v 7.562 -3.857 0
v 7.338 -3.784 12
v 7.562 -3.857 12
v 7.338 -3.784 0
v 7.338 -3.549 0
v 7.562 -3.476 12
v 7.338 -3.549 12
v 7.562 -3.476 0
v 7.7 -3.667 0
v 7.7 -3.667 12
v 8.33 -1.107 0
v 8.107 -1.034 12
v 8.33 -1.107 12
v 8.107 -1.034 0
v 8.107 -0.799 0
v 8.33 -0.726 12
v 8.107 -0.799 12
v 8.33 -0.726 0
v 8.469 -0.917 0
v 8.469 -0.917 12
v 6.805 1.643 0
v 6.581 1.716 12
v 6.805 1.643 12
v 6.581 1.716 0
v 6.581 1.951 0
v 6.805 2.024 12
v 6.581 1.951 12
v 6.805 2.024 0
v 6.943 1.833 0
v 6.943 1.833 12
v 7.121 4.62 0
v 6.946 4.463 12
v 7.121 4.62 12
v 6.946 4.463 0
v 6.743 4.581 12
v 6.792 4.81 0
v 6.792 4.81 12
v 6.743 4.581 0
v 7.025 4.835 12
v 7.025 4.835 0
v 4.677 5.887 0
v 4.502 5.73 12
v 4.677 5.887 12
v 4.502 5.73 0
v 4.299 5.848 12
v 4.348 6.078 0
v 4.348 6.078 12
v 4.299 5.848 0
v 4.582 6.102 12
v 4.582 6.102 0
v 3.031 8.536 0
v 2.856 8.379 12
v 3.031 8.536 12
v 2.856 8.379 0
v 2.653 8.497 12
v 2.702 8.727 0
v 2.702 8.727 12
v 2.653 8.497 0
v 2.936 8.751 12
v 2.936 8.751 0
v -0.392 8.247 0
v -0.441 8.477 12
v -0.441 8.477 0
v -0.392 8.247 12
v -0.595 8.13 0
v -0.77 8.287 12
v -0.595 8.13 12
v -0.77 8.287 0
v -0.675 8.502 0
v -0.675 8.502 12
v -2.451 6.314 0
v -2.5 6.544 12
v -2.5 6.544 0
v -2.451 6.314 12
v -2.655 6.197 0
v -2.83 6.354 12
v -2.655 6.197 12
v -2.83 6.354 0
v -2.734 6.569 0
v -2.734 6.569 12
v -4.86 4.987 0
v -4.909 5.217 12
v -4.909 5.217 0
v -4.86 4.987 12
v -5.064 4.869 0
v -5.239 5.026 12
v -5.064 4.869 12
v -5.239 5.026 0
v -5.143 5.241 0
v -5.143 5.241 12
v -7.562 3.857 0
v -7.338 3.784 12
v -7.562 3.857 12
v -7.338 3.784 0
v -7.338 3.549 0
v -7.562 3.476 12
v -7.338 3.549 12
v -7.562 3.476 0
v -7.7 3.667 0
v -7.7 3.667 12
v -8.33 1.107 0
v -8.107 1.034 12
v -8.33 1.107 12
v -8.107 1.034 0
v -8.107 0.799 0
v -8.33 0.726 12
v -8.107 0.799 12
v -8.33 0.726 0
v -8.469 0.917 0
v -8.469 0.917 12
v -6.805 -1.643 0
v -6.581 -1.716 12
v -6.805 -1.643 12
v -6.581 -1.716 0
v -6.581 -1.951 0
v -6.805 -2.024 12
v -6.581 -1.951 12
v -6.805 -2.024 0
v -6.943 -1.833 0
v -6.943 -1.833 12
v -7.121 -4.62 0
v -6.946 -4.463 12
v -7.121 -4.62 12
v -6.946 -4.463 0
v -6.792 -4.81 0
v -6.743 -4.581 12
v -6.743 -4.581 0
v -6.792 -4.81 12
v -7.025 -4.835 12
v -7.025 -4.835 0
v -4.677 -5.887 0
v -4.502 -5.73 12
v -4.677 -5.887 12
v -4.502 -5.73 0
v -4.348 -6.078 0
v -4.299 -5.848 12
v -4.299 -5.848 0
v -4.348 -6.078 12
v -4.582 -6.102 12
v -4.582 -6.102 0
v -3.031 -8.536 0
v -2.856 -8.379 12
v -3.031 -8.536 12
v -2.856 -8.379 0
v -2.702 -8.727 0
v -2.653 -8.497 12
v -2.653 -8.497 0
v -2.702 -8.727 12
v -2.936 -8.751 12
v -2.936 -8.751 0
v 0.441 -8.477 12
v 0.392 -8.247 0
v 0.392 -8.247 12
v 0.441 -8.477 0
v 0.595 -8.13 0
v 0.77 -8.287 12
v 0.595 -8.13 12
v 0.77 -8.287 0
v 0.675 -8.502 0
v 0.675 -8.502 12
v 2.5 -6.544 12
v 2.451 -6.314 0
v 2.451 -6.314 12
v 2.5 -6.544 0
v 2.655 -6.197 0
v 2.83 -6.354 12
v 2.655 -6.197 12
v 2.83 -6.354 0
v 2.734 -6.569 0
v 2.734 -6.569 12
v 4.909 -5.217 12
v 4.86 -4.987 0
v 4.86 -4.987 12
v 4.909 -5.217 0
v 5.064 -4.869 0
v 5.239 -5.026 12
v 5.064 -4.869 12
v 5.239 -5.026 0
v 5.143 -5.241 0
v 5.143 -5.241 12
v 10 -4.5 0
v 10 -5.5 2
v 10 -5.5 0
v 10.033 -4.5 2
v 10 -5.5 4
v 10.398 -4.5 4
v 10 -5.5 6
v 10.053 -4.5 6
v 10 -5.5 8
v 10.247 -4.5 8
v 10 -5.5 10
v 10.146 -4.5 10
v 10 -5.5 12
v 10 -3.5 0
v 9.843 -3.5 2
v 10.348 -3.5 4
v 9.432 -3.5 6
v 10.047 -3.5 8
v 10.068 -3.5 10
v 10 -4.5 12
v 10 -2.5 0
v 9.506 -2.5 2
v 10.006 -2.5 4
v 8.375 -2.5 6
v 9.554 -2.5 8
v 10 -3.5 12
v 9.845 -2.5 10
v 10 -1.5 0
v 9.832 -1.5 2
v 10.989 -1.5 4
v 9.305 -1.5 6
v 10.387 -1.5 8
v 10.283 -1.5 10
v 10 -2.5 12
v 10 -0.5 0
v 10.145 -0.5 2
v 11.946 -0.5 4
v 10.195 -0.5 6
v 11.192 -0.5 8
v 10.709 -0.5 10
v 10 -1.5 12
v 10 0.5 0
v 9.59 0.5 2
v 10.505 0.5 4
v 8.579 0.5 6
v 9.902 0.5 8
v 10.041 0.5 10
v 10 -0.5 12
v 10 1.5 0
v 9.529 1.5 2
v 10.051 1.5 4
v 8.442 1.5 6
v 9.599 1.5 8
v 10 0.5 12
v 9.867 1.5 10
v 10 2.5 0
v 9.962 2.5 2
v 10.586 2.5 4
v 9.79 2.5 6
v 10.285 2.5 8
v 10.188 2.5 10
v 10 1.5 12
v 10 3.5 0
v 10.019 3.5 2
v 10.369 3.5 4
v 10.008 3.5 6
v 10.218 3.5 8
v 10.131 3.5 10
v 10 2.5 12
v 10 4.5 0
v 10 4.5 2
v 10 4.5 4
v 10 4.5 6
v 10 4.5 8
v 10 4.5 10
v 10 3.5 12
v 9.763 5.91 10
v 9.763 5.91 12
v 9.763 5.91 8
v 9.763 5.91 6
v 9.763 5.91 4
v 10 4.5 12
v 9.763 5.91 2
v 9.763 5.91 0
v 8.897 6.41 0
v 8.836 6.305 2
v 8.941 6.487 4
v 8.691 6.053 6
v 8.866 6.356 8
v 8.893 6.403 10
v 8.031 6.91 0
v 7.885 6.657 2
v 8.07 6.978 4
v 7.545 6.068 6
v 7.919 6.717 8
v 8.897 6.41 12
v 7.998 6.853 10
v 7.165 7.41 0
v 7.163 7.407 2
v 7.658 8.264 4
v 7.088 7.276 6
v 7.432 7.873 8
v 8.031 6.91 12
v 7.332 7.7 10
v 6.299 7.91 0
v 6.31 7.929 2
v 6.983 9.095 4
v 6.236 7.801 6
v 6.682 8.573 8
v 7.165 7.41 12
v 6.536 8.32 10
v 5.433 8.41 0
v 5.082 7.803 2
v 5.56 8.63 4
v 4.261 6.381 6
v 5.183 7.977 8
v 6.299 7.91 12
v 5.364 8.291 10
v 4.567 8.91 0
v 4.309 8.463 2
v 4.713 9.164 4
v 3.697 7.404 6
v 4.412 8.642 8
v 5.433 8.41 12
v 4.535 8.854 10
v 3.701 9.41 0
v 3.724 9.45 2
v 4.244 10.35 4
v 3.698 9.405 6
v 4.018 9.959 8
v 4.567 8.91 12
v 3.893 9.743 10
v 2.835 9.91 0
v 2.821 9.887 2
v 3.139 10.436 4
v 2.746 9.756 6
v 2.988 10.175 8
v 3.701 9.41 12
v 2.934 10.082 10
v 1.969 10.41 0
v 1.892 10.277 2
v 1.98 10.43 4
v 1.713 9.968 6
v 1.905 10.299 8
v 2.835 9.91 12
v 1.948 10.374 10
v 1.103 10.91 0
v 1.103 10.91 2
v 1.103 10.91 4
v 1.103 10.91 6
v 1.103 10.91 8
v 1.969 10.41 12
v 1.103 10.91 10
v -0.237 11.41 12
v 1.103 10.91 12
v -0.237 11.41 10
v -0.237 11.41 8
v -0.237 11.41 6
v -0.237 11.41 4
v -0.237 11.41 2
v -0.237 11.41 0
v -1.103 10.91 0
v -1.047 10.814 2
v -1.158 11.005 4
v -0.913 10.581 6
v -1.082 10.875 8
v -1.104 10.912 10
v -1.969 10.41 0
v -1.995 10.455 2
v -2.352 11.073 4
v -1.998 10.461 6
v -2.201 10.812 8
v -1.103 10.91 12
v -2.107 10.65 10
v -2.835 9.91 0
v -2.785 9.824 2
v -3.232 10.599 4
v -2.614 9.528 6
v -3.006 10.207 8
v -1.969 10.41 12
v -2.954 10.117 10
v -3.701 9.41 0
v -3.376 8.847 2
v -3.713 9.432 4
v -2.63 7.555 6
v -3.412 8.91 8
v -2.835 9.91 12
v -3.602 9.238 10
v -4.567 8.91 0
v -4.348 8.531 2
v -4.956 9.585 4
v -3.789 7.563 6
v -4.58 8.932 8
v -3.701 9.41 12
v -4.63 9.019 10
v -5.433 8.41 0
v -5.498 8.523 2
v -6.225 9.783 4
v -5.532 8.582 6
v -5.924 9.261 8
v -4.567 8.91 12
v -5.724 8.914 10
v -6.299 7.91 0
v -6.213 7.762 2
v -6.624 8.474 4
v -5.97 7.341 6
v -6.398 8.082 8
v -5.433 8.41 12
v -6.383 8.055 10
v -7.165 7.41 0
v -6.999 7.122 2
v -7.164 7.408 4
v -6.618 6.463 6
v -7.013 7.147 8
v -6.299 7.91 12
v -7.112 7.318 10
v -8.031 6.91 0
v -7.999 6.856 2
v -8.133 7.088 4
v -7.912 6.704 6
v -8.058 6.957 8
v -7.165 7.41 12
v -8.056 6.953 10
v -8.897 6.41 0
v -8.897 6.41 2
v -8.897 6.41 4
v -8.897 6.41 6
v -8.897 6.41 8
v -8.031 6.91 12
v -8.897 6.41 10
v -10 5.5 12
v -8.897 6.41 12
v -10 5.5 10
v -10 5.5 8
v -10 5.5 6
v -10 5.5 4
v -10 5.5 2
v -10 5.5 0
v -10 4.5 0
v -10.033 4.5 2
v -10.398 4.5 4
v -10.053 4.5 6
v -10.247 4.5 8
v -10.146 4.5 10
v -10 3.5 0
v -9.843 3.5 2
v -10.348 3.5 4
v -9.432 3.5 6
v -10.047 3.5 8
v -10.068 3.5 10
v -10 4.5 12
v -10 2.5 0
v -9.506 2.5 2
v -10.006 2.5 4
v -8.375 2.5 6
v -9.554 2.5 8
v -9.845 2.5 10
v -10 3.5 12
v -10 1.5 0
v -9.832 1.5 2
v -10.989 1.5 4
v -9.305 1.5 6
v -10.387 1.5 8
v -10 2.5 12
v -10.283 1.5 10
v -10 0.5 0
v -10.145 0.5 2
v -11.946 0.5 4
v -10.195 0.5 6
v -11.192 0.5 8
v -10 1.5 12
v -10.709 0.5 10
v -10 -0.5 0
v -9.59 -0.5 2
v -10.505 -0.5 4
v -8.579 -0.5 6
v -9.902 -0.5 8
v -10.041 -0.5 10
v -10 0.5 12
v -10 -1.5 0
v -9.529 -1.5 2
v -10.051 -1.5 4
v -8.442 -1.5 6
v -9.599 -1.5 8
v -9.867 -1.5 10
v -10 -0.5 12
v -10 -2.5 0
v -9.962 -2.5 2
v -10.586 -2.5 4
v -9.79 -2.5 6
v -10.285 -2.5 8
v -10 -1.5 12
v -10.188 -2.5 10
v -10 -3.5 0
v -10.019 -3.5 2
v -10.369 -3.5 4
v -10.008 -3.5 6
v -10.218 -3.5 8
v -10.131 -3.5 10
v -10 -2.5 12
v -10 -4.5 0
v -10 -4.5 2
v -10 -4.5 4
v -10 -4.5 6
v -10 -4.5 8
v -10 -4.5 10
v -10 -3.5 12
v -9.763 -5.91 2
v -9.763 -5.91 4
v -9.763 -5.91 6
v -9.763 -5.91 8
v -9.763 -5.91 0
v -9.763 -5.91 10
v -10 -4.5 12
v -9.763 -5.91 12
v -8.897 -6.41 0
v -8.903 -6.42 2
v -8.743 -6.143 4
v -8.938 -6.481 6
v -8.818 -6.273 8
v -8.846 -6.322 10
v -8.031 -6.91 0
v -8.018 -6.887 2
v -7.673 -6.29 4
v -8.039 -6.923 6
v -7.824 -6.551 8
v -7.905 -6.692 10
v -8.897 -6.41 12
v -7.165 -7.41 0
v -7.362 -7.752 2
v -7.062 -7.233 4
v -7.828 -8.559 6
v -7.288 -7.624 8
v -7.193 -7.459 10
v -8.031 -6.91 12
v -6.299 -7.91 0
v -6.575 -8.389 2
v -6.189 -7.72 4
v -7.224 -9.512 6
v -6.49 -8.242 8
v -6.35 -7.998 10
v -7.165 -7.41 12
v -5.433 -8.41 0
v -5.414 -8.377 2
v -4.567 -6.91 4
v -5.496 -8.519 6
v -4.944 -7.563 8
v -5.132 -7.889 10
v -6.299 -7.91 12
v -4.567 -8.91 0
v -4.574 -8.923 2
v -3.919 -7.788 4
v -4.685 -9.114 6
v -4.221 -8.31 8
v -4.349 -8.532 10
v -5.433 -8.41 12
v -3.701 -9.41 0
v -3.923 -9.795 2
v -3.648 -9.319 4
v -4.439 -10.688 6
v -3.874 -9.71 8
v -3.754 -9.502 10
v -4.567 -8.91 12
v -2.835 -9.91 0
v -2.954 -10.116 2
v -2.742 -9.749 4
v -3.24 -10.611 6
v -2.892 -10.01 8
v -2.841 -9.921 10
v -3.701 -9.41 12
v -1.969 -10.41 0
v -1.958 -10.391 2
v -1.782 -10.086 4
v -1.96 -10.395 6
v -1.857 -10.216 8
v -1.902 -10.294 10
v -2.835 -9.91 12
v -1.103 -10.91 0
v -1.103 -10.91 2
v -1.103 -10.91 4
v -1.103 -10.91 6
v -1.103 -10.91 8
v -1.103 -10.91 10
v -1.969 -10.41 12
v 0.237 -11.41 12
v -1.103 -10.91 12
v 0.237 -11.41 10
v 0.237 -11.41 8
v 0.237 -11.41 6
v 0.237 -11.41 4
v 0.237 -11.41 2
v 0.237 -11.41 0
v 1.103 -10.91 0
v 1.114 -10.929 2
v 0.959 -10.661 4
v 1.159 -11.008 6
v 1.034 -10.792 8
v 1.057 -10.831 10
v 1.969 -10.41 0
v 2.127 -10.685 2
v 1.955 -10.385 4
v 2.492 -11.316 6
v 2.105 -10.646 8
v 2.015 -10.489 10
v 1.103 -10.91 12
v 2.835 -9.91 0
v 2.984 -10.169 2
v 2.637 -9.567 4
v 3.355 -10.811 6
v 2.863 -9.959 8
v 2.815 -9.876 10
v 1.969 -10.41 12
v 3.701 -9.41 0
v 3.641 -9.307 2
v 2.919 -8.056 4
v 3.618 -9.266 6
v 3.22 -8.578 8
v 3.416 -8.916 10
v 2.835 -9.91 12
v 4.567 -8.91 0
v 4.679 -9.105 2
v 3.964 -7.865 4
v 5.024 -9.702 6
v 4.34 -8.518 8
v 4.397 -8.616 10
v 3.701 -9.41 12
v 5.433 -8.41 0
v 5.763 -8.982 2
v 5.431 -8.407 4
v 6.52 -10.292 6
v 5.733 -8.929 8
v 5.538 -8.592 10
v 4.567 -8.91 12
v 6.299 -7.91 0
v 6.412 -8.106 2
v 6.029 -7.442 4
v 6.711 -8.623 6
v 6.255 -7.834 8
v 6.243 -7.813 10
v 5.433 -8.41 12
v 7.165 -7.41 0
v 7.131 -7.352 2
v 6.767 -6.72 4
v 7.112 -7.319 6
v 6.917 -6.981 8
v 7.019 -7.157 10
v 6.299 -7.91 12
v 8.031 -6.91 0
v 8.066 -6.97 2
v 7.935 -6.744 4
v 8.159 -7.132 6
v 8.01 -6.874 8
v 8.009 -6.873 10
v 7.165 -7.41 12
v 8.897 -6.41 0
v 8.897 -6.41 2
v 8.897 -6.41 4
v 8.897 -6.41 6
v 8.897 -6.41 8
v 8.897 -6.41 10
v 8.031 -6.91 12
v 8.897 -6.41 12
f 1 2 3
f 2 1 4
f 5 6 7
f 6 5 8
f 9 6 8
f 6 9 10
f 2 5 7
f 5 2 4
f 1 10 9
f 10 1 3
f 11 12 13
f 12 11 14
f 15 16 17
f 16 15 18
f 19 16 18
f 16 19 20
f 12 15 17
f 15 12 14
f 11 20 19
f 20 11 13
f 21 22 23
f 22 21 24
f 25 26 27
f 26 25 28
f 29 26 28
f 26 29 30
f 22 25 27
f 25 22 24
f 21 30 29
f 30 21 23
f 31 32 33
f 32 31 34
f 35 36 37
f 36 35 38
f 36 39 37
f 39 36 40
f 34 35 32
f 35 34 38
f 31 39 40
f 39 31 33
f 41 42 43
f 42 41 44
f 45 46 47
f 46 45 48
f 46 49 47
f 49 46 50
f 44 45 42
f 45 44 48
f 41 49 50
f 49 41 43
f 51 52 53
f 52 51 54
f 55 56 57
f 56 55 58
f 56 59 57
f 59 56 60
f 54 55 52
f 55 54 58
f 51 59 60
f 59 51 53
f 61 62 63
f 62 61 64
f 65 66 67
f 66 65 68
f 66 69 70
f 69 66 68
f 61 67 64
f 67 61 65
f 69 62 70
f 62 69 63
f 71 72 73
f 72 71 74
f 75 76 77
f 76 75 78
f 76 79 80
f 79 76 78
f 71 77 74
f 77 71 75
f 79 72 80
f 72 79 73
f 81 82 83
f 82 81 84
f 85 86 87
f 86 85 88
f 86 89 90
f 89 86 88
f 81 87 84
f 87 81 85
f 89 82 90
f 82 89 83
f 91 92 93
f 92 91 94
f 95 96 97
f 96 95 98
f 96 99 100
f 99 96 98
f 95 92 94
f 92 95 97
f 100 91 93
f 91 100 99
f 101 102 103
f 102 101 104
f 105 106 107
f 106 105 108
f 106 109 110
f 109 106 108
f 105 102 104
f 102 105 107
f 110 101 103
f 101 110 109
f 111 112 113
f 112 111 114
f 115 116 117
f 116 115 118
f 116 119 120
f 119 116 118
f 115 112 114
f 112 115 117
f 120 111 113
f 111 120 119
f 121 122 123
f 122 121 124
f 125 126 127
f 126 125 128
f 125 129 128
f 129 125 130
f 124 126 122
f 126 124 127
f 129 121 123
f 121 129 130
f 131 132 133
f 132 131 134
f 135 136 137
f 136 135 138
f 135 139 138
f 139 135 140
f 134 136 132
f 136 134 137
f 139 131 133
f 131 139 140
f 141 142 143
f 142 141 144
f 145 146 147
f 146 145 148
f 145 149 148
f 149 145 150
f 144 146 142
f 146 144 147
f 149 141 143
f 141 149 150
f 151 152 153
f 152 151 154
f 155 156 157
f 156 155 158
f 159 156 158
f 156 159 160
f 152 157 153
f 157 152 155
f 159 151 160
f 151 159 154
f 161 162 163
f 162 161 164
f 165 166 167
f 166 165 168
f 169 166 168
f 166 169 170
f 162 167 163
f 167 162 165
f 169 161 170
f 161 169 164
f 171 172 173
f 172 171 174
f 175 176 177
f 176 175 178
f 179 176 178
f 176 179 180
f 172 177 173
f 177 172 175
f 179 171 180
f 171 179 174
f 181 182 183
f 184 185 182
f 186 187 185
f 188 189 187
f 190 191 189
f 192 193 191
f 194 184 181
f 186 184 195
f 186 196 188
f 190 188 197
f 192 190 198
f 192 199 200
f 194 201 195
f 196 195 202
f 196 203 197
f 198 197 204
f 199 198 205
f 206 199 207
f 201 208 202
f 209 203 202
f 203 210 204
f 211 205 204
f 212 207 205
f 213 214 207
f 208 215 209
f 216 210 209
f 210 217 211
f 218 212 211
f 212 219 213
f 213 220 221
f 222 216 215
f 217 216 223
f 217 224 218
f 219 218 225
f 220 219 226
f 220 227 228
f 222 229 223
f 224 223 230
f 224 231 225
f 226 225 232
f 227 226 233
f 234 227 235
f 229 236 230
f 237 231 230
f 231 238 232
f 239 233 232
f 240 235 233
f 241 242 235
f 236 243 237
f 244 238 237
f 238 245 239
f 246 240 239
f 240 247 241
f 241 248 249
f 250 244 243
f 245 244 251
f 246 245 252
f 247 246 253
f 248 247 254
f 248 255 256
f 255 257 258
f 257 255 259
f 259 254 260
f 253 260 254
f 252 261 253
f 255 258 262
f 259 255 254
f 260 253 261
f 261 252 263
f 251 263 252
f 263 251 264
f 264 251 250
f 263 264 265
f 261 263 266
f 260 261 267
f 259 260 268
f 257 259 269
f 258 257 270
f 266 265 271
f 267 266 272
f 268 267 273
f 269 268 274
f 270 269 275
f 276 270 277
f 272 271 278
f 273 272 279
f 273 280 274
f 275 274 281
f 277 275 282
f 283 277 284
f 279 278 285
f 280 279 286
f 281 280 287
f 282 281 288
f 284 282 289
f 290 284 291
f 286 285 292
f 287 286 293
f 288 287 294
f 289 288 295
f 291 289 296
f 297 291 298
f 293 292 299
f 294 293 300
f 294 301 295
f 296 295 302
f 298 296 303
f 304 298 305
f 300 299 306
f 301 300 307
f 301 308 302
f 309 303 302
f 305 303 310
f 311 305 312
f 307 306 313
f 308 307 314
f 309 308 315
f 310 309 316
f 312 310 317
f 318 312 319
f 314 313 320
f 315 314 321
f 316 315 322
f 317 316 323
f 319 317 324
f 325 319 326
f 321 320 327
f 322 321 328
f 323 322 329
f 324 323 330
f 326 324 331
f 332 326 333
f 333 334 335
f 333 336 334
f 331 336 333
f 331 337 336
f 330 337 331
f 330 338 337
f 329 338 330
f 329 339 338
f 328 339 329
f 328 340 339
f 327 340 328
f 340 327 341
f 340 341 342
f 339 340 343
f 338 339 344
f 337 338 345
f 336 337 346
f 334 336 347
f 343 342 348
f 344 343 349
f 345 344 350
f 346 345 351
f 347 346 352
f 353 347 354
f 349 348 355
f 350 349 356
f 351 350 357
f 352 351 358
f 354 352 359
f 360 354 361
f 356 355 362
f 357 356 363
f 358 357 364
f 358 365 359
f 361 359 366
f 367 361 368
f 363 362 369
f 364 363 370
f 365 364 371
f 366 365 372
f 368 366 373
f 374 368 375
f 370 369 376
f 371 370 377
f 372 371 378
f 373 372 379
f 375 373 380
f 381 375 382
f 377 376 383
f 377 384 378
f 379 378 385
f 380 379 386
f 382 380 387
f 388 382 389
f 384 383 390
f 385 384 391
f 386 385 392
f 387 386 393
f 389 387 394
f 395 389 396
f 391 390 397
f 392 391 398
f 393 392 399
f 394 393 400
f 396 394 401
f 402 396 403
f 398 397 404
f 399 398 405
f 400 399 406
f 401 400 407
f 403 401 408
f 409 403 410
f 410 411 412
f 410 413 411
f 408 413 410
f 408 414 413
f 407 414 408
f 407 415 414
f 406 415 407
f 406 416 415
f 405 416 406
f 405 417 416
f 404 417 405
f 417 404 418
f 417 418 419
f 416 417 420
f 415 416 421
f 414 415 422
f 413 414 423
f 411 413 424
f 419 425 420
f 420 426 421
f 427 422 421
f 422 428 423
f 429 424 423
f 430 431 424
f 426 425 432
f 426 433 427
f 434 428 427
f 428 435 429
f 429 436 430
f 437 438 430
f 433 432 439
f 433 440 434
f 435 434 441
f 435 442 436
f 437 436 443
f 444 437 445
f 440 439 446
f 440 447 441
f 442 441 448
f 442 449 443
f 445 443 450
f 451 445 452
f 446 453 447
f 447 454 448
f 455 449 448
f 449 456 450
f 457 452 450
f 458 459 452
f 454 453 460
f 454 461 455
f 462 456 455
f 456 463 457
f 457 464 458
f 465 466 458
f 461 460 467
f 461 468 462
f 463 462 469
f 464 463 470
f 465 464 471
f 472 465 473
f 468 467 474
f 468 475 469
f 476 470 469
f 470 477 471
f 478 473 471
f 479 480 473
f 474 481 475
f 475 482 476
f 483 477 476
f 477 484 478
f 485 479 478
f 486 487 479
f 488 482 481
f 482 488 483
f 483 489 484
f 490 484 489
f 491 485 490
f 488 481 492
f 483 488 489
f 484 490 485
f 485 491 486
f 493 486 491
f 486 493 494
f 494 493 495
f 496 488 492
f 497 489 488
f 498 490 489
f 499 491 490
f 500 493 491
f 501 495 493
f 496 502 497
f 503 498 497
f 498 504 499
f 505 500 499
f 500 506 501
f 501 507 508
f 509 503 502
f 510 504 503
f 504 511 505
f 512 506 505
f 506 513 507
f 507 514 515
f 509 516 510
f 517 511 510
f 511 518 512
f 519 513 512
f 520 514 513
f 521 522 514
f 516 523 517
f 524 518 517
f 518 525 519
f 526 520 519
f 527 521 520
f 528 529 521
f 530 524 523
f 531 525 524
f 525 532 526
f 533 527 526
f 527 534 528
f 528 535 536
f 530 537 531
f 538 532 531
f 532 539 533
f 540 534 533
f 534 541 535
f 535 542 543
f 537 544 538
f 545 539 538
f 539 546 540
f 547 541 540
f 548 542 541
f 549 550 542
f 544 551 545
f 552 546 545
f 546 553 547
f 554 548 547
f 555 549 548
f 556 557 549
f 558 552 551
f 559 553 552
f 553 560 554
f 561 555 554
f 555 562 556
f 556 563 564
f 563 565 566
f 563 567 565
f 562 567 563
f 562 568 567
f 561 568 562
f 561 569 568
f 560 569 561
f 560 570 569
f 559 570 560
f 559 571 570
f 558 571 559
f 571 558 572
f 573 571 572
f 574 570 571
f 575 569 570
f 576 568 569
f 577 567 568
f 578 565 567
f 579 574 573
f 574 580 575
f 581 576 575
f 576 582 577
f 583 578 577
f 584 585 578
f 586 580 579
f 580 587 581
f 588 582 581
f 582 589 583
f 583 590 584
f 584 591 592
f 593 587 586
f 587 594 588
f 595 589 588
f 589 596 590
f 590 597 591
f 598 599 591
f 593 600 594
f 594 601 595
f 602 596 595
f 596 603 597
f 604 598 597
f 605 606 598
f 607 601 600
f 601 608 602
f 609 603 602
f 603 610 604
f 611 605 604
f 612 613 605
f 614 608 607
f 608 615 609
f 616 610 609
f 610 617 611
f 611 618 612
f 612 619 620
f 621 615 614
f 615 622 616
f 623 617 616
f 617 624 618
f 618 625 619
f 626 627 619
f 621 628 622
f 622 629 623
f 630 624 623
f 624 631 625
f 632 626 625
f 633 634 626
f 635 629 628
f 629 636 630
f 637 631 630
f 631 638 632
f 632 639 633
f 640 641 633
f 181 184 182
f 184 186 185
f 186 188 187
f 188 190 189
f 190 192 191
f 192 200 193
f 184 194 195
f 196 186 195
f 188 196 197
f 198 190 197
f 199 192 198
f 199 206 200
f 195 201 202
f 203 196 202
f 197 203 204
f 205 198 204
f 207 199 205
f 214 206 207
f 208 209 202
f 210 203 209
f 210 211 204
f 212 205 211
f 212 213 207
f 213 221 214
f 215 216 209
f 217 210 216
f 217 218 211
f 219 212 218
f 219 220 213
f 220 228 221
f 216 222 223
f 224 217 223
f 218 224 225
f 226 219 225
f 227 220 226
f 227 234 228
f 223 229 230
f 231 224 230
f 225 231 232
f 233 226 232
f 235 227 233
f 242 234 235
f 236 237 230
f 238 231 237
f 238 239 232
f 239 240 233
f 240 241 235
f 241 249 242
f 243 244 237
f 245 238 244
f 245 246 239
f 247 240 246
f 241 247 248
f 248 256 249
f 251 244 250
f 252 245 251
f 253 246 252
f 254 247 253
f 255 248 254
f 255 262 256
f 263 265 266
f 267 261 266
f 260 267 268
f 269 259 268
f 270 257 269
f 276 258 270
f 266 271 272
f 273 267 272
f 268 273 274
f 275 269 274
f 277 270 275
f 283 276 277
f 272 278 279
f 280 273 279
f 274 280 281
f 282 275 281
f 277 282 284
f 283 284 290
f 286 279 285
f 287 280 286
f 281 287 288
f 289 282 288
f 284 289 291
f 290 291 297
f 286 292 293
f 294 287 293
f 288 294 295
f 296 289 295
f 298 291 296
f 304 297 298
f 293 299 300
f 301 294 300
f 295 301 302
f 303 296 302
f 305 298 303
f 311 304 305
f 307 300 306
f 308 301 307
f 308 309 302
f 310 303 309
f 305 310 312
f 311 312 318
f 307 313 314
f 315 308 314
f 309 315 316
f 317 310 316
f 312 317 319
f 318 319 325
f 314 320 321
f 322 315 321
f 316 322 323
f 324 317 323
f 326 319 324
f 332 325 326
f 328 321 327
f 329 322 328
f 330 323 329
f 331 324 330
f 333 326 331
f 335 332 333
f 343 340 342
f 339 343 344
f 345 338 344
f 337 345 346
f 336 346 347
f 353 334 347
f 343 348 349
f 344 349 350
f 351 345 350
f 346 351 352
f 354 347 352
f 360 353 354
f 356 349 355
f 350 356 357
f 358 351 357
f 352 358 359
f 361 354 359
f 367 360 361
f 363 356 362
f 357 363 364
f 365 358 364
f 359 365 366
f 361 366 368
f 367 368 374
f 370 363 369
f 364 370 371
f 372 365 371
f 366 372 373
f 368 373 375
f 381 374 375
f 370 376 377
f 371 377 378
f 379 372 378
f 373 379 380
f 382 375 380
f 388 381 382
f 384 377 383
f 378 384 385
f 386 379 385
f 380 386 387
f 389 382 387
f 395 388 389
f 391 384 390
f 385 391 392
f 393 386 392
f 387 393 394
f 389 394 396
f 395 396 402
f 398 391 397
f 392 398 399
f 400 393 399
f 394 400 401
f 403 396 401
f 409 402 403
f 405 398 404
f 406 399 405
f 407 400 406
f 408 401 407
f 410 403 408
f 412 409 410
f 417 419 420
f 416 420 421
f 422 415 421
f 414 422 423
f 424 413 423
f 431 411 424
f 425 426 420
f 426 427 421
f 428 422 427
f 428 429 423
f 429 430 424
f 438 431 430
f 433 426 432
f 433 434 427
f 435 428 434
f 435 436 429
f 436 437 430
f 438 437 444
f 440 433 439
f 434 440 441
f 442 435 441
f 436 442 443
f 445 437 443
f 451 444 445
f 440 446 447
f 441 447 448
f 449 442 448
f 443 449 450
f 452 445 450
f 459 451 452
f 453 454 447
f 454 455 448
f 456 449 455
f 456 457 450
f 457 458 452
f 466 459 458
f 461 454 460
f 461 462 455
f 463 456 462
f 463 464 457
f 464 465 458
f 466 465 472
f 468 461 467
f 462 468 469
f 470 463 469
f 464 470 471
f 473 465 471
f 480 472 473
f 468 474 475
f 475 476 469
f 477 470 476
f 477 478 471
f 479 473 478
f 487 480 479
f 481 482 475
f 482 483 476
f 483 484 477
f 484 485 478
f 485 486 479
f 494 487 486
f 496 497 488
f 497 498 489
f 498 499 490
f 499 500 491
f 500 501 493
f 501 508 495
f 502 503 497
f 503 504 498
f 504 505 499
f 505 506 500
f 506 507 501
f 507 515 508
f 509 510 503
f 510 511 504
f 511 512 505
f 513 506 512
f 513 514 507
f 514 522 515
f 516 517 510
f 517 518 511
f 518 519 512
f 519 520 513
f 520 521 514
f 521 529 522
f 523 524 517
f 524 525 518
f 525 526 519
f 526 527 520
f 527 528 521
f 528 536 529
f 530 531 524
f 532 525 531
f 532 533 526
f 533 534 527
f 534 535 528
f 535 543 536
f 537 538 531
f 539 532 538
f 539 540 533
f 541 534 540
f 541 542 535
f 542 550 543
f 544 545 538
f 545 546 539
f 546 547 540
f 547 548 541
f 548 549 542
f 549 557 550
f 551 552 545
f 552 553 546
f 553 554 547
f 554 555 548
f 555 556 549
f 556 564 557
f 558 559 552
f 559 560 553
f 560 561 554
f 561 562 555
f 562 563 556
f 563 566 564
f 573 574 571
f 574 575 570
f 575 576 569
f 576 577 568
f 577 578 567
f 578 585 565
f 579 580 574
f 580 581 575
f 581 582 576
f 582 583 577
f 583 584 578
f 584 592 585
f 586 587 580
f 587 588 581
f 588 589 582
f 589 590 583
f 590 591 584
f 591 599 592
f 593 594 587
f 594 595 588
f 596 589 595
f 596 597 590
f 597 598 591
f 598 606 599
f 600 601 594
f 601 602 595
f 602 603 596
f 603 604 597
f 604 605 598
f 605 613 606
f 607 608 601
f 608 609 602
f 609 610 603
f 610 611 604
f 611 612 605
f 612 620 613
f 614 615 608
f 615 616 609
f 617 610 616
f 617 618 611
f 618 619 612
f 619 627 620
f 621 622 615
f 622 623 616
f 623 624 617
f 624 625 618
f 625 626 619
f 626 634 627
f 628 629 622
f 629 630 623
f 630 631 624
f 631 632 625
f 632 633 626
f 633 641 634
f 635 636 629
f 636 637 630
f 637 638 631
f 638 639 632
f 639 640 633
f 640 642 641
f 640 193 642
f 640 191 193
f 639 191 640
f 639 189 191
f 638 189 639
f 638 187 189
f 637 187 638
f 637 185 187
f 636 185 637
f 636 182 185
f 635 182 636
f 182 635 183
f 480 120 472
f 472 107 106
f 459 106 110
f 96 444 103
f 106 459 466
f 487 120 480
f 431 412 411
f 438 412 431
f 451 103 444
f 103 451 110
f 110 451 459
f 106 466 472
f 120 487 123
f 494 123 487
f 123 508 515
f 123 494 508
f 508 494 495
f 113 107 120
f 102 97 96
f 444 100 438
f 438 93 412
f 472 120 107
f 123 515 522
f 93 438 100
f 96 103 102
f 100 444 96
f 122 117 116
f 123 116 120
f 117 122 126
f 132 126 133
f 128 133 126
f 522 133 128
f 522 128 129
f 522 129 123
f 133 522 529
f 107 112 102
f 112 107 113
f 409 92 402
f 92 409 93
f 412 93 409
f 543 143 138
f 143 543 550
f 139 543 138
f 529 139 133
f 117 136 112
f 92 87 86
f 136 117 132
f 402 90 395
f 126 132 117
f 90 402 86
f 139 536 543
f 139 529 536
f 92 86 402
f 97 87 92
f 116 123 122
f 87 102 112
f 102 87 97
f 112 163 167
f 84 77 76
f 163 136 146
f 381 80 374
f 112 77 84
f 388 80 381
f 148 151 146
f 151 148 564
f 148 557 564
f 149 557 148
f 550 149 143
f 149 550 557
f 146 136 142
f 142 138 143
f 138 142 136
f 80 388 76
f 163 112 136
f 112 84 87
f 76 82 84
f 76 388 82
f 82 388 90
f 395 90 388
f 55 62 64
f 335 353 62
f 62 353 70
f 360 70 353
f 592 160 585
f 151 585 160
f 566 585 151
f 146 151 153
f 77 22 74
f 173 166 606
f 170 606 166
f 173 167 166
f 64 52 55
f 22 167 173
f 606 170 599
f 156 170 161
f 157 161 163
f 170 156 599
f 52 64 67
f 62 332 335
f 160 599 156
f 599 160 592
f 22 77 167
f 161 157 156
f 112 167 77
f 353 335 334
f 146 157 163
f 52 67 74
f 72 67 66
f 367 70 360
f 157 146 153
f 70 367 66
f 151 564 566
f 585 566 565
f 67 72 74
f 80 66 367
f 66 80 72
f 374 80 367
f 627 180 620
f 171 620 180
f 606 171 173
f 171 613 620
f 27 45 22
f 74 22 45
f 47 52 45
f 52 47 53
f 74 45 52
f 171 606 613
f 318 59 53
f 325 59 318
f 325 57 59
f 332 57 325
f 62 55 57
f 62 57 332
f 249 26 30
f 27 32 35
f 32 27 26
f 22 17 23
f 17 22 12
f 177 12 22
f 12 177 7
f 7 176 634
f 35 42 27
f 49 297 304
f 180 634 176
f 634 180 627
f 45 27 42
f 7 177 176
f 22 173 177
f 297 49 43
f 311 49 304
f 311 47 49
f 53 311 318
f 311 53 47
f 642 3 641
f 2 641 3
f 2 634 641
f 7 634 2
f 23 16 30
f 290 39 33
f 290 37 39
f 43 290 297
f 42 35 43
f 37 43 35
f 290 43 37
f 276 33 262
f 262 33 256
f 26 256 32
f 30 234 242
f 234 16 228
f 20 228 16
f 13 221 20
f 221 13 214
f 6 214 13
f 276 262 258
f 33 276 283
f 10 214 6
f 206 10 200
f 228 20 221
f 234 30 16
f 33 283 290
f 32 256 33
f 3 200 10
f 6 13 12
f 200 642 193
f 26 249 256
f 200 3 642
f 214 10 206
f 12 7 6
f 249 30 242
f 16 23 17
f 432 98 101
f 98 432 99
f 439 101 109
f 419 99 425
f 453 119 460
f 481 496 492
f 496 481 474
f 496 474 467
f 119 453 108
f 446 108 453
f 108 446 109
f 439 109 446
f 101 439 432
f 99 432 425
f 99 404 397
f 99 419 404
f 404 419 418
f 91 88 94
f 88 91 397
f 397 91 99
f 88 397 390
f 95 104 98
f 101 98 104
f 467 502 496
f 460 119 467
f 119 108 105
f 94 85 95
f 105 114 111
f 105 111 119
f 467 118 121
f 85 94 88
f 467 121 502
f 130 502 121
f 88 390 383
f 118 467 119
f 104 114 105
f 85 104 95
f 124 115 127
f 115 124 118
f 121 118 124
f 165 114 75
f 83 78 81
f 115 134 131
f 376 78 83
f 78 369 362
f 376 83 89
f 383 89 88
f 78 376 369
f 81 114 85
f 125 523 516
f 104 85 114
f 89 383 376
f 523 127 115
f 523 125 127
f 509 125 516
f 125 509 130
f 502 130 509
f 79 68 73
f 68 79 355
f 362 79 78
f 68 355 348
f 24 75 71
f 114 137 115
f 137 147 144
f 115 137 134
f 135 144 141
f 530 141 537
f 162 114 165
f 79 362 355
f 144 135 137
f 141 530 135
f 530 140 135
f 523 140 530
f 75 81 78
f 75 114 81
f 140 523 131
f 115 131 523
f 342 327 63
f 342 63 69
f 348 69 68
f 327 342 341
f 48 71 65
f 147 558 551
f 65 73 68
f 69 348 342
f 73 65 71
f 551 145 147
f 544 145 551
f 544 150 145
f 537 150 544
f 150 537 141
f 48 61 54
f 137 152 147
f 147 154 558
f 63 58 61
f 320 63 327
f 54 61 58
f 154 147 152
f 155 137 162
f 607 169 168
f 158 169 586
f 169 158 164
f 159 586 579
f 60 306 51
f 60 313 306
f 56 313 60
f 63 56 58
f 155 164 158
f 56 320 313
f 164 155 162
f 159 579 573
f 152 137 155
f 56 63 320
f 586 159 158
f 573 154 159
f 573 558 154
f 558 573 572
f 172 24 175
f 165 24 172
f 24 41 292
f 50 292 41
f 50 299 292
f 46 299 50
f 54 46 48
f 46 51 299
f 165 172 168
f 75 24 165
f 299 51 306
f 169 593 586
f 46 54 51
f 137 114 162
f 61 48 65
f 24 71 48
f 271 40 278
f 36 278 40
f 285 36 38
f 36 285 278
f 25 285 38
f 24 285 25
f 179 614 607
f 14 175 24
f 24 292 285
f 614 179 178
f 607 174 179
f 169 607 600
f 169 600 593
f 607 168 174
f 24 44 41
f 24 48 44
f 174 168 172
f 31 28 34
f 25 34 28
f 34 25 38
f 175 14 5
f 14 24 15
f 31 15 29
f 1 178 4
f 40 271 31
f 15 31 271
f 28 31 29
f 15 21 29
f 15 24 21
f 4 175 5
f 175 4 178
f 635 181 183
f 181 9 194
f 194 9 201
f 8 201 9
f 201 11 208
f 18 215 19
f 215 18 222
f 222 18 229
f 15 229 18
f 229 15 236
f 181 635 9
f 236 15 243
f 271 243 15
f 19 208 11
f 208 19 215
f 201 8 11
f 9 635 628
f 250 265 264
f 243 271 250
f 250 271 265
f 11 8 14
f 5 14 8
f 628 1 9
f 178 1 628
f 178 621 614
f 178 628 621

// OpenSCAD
use <eggcrate.scad>;

/** Points of a plane, to which the +x axis is normal
    sy, sz: number of samples in y and z directions.
    dy, dz: size of samples in y and z directions, in units.
    x_offset: location of troughs, in units.
    
    Note (if eggcrate.scad still exists when you read this) that this
    one subtly differs from the one in eggcrate.scad: the loop indices
    are reversed, and we leave off the last y, because it is the same
    row of points as the first row in the next plane around the
    hexagonal prism.
 */
function x_grid_points_for_hex(sy, sz, dy, dz, x_offset, last) =
     [for(y=[0:1:(last!=0?sy:sy-1)], z=[0:1:sz])
               [x_offset, y*dy, z*dz]];

function ease(frac, total, x) =
     [for(dontcare=[0:0])
               let(a=floor(frac*total),
                   b=floor((1-frac)*total))
                    (x <= a) ? (x / a) :
                    (x >= b) ? 1 - ((x-b) / a) : 1][0];

/** Points of a wobbly plane, to which the +x axis is normal.
    sy, sz: number of samples in y and z directions.
    dy, dz: size of samples in y and z directions, in units.
    fy, fz: frequency of sine functions in y and z directions -
            given in units, not in samples.
    py, pz: phase in y and z directions - degrees.
    x_offset: location of midpoint of waves, in units.
    amplitude: depth from peak to trough, in units.

    As above, we loop through y first and leave off a row in some
    cases.

*/
function x_eggcrate_points_for_hex(sy, sz, dy, dz, fy, fz,
                           py, pz, ay, az, x_offset, last) =
     [for(y=[0:1:sy-1], z=[0:1:sz])
               let(ease_frac_y = min(max(0.25, 8/sy), 0.5),
                   ease_frac_z = min(max(0.25, 8/sz), 0.5),
                   y_ease = ease(ease_frac_y, sy, y),
                   z_ease = ease(ease_frac_z, sz, z))

               [x_offset+1/4*(0+ /* use 2 if you want troughs at 0 */
                              y_ease*z_ease*ay*sin((y*dy)*fy*360+py)+
                              y_ease*z_ease*az*sin((z*dz)*fz*360+pz)),
                y*dy - (sy/2 * dy),
                z*dz]];

module lace_holes_one_face(how_many, hole_r, from_edge,
                           sy, sz, dy, dz, fy, fz,
                           py, pz, ay, az, x_offset) {
     /* these will be differenced so make them go all the way through */
     h_fudge = 2;
     h = sz * dz;
     center_y = (sy*dy) / (how_many+2);
     for(i=[0:1:how_many-2]) {
          y = (i / how_many) * sy; // 0 to sy or so
          ease_frac_y = min(max(0.25, 8/sy), 0.5);
          y_ease = ease(ease_frac_y, sy, y);
          /* for some reason this doesn't move the hole in far
           * enough. just pass in from_edge > 0 and it will be
           * fine. */
          max_x = x_offset+1/4*(0+
                                y_ease*1*ay*
                                  sin(((y*dy)+center_y)*fy*360+py)+
                                1*1*az*-1);
          x = max_x - from_edge;
          translate([x, y*dy - (sy*dy)/2 + center_y, h/2])
               color("red")
               cylinder(r=hole_r, h=h+h_fudge, center=true);
     }
}

function hex_prism_top_and_bottom_faces(sy, sz) =
     concat([for(y=[0:1:sy-1])
                      [
                       (y+1)*(sz+1)-1,
                           y*(sz+1)-1,
                       /* top center */
                       sy*(sz+1)]],
            [for(y=[0:1:sy-2])
                      [y*(sz+1),
                       (y+1)*(sz+1),
                       /* bottom center */
                       sy*(sz+1)+1]],
            [
                 /* last slice of top */
                 [1*(sz+1)-1, sy*(sz+1)-1, sy*(sz+1)],
                 /* last slice of bottom */
                 [(sy-1)*(sz+1), 0, sy*(sz+1)+1]]);

function hex_prism_grid_points(rmin, sy, sz, dy, dz) =
     concat([for(a=[0:60:360-1],
                      v=x_grid_points_for_hex(sy, sz, dy, dz, rmin, 0))
                      [[cos(a), -sin(a), 0],
                       [sin(a), cos(a), 0],
                       [0, 0, 1]] * v]);

function hex_prism_eggcrate_points(rmin, sy, sz, dy, dz, fy, fz,
                                   py, pz, ay, az) =
     concat([for(a=[0:60:360-1],
                      v=x_eggcrate_points_for_hex(
                           sy, sz, dy, dz, fy, fz,
                           py+a*2, pz+(a>180?180:0),
                           ay, az, rmin, a >= 300 ? 1 : 0))
                      [[cos(a), -sin(a), 0],
                       [sin(a), cos(a),  0],
                       [0,      0,       1]] * v]);

function minusx_last_strip_a(sy, sz) =
     [for(y=[0:1:sy-1])
               [
                y+0+0*(sy+1),
                    y+0+(sz-1)*(sy+1),
                y+1+0*(sy+1)
                    ]];

function minusx_last_strip_b(sy, sz) =
     [for(y=[0:1:sy-1])
               [
                y+0+(sz-1)*(sy+1),
                    y+1+(sz-1)*(sy+1),
                y+1+0*(sy+1)
                    ]];

module hex_prism(rmin, h, res, waves, amp,
                 lace_p, lace_n, lace_r, lace_from_edge) {
     side = rmin * (2*tan(180/6));
     s = [0, floor(side / res.y), floor(h / res.z)];
     f = [0, waves.y/side, waves.z/h];
     p = [0, 0, 0];
     points = concat(
          hex_prism_eggcrate_points(rmin, s.y, s.z, res.y, res.z,
                                    f.y, f.z, p.y, p.z, amp.y, amp.z),
          [[0, 0, (floor(h/res.z)*res.z)],
           [0, 0, 0]]);
     faces = concat(
          minusx_grid_faces_a(s.z, s.y*6-1),
          minusx_grid_faces_b(s.z, s.y*6-1),
          minusx_last_strip_a(s.z, s.y*6),
          minusx_last_strip_b(s.z, s.y*6),
          hex_prism_top_and_bottom_faces(s.y*6, s.z)
          );
     difference() {
          polyhedron(points=points, faces=faces, convexity=20);
          if(lace_p != 0) {
               for(a=[0:60:360-1]) {
                    rotate(a=a, v=[0,0,1])
                         lace_holes_one_face(lace_n, lace_r, lace_from_edge,
                                             s.y, s.z, res.y, res.z, f.y, f.z,
                                             p.y+a*2, p.z+(a>180?180:0),
                                             amp.y, amp.z, rmin);
               }
          }
     }
}

module hex_prism_of_grid(bounds, which, rmin, gap, res, waves, amp,
                         lace_p, lace_n, lace_r, lace_from_edge) {
     rmaj = rmin / cos(180/6);
     side = rmin * (2*tan(180/6));
     row_y = 3/2 * side + gap * sin(60);
     /* rmin: make sure to cover entire width */
     columns = ceil((bounds.x + rmin) / (2*rmin));
     column = which % columns;
     row = floor(which / columns);
     x_offset = row % 2 != 0 ? rmin + gap/2 : 0;
     translate([column * (rmin * 2 + gap) + x_offset,
                row * row_y, 0])
          hex_prism(rmin, bounds.z, res, waves, amp,
                    lace_p, lace_n, lace_r, lace_from_edge);
}
          


module hex_test_object_three() {
     slop = 2;
     minor_radius = 40;
     tx = minor_radius + slop;

     module my_hex_prism() {
          hex_prism(20, 40, [0, 0.5, 1], [0, 3, 4], [0, 3, 3]);
     }
     my_hex_prism();

     for(a=[0:60:360-1]) {
          rotate(a=a, v=[0,0,1])
               translate([tx, 0, 0])
               rotate(a=-a, v=[0,0,1])
               my_hex_prism();
     }
}

module hex_test_object_four() {
     for(i=[0:0]) {
          hex_prism_of_grid([220, 180, 200], i, 42, 1,
                            [2,2,2], [5,5,5], [10, 10, 10],
                            1, 12, 0.2, 1);
          }
}

module hex_test_object_five() {
     hex_prism(10, 13, [0, 1, 2], [0, 3, 4], [0, 6, 6],
          1, 4, 0.2, 1);
}

hex_test_object_five();
